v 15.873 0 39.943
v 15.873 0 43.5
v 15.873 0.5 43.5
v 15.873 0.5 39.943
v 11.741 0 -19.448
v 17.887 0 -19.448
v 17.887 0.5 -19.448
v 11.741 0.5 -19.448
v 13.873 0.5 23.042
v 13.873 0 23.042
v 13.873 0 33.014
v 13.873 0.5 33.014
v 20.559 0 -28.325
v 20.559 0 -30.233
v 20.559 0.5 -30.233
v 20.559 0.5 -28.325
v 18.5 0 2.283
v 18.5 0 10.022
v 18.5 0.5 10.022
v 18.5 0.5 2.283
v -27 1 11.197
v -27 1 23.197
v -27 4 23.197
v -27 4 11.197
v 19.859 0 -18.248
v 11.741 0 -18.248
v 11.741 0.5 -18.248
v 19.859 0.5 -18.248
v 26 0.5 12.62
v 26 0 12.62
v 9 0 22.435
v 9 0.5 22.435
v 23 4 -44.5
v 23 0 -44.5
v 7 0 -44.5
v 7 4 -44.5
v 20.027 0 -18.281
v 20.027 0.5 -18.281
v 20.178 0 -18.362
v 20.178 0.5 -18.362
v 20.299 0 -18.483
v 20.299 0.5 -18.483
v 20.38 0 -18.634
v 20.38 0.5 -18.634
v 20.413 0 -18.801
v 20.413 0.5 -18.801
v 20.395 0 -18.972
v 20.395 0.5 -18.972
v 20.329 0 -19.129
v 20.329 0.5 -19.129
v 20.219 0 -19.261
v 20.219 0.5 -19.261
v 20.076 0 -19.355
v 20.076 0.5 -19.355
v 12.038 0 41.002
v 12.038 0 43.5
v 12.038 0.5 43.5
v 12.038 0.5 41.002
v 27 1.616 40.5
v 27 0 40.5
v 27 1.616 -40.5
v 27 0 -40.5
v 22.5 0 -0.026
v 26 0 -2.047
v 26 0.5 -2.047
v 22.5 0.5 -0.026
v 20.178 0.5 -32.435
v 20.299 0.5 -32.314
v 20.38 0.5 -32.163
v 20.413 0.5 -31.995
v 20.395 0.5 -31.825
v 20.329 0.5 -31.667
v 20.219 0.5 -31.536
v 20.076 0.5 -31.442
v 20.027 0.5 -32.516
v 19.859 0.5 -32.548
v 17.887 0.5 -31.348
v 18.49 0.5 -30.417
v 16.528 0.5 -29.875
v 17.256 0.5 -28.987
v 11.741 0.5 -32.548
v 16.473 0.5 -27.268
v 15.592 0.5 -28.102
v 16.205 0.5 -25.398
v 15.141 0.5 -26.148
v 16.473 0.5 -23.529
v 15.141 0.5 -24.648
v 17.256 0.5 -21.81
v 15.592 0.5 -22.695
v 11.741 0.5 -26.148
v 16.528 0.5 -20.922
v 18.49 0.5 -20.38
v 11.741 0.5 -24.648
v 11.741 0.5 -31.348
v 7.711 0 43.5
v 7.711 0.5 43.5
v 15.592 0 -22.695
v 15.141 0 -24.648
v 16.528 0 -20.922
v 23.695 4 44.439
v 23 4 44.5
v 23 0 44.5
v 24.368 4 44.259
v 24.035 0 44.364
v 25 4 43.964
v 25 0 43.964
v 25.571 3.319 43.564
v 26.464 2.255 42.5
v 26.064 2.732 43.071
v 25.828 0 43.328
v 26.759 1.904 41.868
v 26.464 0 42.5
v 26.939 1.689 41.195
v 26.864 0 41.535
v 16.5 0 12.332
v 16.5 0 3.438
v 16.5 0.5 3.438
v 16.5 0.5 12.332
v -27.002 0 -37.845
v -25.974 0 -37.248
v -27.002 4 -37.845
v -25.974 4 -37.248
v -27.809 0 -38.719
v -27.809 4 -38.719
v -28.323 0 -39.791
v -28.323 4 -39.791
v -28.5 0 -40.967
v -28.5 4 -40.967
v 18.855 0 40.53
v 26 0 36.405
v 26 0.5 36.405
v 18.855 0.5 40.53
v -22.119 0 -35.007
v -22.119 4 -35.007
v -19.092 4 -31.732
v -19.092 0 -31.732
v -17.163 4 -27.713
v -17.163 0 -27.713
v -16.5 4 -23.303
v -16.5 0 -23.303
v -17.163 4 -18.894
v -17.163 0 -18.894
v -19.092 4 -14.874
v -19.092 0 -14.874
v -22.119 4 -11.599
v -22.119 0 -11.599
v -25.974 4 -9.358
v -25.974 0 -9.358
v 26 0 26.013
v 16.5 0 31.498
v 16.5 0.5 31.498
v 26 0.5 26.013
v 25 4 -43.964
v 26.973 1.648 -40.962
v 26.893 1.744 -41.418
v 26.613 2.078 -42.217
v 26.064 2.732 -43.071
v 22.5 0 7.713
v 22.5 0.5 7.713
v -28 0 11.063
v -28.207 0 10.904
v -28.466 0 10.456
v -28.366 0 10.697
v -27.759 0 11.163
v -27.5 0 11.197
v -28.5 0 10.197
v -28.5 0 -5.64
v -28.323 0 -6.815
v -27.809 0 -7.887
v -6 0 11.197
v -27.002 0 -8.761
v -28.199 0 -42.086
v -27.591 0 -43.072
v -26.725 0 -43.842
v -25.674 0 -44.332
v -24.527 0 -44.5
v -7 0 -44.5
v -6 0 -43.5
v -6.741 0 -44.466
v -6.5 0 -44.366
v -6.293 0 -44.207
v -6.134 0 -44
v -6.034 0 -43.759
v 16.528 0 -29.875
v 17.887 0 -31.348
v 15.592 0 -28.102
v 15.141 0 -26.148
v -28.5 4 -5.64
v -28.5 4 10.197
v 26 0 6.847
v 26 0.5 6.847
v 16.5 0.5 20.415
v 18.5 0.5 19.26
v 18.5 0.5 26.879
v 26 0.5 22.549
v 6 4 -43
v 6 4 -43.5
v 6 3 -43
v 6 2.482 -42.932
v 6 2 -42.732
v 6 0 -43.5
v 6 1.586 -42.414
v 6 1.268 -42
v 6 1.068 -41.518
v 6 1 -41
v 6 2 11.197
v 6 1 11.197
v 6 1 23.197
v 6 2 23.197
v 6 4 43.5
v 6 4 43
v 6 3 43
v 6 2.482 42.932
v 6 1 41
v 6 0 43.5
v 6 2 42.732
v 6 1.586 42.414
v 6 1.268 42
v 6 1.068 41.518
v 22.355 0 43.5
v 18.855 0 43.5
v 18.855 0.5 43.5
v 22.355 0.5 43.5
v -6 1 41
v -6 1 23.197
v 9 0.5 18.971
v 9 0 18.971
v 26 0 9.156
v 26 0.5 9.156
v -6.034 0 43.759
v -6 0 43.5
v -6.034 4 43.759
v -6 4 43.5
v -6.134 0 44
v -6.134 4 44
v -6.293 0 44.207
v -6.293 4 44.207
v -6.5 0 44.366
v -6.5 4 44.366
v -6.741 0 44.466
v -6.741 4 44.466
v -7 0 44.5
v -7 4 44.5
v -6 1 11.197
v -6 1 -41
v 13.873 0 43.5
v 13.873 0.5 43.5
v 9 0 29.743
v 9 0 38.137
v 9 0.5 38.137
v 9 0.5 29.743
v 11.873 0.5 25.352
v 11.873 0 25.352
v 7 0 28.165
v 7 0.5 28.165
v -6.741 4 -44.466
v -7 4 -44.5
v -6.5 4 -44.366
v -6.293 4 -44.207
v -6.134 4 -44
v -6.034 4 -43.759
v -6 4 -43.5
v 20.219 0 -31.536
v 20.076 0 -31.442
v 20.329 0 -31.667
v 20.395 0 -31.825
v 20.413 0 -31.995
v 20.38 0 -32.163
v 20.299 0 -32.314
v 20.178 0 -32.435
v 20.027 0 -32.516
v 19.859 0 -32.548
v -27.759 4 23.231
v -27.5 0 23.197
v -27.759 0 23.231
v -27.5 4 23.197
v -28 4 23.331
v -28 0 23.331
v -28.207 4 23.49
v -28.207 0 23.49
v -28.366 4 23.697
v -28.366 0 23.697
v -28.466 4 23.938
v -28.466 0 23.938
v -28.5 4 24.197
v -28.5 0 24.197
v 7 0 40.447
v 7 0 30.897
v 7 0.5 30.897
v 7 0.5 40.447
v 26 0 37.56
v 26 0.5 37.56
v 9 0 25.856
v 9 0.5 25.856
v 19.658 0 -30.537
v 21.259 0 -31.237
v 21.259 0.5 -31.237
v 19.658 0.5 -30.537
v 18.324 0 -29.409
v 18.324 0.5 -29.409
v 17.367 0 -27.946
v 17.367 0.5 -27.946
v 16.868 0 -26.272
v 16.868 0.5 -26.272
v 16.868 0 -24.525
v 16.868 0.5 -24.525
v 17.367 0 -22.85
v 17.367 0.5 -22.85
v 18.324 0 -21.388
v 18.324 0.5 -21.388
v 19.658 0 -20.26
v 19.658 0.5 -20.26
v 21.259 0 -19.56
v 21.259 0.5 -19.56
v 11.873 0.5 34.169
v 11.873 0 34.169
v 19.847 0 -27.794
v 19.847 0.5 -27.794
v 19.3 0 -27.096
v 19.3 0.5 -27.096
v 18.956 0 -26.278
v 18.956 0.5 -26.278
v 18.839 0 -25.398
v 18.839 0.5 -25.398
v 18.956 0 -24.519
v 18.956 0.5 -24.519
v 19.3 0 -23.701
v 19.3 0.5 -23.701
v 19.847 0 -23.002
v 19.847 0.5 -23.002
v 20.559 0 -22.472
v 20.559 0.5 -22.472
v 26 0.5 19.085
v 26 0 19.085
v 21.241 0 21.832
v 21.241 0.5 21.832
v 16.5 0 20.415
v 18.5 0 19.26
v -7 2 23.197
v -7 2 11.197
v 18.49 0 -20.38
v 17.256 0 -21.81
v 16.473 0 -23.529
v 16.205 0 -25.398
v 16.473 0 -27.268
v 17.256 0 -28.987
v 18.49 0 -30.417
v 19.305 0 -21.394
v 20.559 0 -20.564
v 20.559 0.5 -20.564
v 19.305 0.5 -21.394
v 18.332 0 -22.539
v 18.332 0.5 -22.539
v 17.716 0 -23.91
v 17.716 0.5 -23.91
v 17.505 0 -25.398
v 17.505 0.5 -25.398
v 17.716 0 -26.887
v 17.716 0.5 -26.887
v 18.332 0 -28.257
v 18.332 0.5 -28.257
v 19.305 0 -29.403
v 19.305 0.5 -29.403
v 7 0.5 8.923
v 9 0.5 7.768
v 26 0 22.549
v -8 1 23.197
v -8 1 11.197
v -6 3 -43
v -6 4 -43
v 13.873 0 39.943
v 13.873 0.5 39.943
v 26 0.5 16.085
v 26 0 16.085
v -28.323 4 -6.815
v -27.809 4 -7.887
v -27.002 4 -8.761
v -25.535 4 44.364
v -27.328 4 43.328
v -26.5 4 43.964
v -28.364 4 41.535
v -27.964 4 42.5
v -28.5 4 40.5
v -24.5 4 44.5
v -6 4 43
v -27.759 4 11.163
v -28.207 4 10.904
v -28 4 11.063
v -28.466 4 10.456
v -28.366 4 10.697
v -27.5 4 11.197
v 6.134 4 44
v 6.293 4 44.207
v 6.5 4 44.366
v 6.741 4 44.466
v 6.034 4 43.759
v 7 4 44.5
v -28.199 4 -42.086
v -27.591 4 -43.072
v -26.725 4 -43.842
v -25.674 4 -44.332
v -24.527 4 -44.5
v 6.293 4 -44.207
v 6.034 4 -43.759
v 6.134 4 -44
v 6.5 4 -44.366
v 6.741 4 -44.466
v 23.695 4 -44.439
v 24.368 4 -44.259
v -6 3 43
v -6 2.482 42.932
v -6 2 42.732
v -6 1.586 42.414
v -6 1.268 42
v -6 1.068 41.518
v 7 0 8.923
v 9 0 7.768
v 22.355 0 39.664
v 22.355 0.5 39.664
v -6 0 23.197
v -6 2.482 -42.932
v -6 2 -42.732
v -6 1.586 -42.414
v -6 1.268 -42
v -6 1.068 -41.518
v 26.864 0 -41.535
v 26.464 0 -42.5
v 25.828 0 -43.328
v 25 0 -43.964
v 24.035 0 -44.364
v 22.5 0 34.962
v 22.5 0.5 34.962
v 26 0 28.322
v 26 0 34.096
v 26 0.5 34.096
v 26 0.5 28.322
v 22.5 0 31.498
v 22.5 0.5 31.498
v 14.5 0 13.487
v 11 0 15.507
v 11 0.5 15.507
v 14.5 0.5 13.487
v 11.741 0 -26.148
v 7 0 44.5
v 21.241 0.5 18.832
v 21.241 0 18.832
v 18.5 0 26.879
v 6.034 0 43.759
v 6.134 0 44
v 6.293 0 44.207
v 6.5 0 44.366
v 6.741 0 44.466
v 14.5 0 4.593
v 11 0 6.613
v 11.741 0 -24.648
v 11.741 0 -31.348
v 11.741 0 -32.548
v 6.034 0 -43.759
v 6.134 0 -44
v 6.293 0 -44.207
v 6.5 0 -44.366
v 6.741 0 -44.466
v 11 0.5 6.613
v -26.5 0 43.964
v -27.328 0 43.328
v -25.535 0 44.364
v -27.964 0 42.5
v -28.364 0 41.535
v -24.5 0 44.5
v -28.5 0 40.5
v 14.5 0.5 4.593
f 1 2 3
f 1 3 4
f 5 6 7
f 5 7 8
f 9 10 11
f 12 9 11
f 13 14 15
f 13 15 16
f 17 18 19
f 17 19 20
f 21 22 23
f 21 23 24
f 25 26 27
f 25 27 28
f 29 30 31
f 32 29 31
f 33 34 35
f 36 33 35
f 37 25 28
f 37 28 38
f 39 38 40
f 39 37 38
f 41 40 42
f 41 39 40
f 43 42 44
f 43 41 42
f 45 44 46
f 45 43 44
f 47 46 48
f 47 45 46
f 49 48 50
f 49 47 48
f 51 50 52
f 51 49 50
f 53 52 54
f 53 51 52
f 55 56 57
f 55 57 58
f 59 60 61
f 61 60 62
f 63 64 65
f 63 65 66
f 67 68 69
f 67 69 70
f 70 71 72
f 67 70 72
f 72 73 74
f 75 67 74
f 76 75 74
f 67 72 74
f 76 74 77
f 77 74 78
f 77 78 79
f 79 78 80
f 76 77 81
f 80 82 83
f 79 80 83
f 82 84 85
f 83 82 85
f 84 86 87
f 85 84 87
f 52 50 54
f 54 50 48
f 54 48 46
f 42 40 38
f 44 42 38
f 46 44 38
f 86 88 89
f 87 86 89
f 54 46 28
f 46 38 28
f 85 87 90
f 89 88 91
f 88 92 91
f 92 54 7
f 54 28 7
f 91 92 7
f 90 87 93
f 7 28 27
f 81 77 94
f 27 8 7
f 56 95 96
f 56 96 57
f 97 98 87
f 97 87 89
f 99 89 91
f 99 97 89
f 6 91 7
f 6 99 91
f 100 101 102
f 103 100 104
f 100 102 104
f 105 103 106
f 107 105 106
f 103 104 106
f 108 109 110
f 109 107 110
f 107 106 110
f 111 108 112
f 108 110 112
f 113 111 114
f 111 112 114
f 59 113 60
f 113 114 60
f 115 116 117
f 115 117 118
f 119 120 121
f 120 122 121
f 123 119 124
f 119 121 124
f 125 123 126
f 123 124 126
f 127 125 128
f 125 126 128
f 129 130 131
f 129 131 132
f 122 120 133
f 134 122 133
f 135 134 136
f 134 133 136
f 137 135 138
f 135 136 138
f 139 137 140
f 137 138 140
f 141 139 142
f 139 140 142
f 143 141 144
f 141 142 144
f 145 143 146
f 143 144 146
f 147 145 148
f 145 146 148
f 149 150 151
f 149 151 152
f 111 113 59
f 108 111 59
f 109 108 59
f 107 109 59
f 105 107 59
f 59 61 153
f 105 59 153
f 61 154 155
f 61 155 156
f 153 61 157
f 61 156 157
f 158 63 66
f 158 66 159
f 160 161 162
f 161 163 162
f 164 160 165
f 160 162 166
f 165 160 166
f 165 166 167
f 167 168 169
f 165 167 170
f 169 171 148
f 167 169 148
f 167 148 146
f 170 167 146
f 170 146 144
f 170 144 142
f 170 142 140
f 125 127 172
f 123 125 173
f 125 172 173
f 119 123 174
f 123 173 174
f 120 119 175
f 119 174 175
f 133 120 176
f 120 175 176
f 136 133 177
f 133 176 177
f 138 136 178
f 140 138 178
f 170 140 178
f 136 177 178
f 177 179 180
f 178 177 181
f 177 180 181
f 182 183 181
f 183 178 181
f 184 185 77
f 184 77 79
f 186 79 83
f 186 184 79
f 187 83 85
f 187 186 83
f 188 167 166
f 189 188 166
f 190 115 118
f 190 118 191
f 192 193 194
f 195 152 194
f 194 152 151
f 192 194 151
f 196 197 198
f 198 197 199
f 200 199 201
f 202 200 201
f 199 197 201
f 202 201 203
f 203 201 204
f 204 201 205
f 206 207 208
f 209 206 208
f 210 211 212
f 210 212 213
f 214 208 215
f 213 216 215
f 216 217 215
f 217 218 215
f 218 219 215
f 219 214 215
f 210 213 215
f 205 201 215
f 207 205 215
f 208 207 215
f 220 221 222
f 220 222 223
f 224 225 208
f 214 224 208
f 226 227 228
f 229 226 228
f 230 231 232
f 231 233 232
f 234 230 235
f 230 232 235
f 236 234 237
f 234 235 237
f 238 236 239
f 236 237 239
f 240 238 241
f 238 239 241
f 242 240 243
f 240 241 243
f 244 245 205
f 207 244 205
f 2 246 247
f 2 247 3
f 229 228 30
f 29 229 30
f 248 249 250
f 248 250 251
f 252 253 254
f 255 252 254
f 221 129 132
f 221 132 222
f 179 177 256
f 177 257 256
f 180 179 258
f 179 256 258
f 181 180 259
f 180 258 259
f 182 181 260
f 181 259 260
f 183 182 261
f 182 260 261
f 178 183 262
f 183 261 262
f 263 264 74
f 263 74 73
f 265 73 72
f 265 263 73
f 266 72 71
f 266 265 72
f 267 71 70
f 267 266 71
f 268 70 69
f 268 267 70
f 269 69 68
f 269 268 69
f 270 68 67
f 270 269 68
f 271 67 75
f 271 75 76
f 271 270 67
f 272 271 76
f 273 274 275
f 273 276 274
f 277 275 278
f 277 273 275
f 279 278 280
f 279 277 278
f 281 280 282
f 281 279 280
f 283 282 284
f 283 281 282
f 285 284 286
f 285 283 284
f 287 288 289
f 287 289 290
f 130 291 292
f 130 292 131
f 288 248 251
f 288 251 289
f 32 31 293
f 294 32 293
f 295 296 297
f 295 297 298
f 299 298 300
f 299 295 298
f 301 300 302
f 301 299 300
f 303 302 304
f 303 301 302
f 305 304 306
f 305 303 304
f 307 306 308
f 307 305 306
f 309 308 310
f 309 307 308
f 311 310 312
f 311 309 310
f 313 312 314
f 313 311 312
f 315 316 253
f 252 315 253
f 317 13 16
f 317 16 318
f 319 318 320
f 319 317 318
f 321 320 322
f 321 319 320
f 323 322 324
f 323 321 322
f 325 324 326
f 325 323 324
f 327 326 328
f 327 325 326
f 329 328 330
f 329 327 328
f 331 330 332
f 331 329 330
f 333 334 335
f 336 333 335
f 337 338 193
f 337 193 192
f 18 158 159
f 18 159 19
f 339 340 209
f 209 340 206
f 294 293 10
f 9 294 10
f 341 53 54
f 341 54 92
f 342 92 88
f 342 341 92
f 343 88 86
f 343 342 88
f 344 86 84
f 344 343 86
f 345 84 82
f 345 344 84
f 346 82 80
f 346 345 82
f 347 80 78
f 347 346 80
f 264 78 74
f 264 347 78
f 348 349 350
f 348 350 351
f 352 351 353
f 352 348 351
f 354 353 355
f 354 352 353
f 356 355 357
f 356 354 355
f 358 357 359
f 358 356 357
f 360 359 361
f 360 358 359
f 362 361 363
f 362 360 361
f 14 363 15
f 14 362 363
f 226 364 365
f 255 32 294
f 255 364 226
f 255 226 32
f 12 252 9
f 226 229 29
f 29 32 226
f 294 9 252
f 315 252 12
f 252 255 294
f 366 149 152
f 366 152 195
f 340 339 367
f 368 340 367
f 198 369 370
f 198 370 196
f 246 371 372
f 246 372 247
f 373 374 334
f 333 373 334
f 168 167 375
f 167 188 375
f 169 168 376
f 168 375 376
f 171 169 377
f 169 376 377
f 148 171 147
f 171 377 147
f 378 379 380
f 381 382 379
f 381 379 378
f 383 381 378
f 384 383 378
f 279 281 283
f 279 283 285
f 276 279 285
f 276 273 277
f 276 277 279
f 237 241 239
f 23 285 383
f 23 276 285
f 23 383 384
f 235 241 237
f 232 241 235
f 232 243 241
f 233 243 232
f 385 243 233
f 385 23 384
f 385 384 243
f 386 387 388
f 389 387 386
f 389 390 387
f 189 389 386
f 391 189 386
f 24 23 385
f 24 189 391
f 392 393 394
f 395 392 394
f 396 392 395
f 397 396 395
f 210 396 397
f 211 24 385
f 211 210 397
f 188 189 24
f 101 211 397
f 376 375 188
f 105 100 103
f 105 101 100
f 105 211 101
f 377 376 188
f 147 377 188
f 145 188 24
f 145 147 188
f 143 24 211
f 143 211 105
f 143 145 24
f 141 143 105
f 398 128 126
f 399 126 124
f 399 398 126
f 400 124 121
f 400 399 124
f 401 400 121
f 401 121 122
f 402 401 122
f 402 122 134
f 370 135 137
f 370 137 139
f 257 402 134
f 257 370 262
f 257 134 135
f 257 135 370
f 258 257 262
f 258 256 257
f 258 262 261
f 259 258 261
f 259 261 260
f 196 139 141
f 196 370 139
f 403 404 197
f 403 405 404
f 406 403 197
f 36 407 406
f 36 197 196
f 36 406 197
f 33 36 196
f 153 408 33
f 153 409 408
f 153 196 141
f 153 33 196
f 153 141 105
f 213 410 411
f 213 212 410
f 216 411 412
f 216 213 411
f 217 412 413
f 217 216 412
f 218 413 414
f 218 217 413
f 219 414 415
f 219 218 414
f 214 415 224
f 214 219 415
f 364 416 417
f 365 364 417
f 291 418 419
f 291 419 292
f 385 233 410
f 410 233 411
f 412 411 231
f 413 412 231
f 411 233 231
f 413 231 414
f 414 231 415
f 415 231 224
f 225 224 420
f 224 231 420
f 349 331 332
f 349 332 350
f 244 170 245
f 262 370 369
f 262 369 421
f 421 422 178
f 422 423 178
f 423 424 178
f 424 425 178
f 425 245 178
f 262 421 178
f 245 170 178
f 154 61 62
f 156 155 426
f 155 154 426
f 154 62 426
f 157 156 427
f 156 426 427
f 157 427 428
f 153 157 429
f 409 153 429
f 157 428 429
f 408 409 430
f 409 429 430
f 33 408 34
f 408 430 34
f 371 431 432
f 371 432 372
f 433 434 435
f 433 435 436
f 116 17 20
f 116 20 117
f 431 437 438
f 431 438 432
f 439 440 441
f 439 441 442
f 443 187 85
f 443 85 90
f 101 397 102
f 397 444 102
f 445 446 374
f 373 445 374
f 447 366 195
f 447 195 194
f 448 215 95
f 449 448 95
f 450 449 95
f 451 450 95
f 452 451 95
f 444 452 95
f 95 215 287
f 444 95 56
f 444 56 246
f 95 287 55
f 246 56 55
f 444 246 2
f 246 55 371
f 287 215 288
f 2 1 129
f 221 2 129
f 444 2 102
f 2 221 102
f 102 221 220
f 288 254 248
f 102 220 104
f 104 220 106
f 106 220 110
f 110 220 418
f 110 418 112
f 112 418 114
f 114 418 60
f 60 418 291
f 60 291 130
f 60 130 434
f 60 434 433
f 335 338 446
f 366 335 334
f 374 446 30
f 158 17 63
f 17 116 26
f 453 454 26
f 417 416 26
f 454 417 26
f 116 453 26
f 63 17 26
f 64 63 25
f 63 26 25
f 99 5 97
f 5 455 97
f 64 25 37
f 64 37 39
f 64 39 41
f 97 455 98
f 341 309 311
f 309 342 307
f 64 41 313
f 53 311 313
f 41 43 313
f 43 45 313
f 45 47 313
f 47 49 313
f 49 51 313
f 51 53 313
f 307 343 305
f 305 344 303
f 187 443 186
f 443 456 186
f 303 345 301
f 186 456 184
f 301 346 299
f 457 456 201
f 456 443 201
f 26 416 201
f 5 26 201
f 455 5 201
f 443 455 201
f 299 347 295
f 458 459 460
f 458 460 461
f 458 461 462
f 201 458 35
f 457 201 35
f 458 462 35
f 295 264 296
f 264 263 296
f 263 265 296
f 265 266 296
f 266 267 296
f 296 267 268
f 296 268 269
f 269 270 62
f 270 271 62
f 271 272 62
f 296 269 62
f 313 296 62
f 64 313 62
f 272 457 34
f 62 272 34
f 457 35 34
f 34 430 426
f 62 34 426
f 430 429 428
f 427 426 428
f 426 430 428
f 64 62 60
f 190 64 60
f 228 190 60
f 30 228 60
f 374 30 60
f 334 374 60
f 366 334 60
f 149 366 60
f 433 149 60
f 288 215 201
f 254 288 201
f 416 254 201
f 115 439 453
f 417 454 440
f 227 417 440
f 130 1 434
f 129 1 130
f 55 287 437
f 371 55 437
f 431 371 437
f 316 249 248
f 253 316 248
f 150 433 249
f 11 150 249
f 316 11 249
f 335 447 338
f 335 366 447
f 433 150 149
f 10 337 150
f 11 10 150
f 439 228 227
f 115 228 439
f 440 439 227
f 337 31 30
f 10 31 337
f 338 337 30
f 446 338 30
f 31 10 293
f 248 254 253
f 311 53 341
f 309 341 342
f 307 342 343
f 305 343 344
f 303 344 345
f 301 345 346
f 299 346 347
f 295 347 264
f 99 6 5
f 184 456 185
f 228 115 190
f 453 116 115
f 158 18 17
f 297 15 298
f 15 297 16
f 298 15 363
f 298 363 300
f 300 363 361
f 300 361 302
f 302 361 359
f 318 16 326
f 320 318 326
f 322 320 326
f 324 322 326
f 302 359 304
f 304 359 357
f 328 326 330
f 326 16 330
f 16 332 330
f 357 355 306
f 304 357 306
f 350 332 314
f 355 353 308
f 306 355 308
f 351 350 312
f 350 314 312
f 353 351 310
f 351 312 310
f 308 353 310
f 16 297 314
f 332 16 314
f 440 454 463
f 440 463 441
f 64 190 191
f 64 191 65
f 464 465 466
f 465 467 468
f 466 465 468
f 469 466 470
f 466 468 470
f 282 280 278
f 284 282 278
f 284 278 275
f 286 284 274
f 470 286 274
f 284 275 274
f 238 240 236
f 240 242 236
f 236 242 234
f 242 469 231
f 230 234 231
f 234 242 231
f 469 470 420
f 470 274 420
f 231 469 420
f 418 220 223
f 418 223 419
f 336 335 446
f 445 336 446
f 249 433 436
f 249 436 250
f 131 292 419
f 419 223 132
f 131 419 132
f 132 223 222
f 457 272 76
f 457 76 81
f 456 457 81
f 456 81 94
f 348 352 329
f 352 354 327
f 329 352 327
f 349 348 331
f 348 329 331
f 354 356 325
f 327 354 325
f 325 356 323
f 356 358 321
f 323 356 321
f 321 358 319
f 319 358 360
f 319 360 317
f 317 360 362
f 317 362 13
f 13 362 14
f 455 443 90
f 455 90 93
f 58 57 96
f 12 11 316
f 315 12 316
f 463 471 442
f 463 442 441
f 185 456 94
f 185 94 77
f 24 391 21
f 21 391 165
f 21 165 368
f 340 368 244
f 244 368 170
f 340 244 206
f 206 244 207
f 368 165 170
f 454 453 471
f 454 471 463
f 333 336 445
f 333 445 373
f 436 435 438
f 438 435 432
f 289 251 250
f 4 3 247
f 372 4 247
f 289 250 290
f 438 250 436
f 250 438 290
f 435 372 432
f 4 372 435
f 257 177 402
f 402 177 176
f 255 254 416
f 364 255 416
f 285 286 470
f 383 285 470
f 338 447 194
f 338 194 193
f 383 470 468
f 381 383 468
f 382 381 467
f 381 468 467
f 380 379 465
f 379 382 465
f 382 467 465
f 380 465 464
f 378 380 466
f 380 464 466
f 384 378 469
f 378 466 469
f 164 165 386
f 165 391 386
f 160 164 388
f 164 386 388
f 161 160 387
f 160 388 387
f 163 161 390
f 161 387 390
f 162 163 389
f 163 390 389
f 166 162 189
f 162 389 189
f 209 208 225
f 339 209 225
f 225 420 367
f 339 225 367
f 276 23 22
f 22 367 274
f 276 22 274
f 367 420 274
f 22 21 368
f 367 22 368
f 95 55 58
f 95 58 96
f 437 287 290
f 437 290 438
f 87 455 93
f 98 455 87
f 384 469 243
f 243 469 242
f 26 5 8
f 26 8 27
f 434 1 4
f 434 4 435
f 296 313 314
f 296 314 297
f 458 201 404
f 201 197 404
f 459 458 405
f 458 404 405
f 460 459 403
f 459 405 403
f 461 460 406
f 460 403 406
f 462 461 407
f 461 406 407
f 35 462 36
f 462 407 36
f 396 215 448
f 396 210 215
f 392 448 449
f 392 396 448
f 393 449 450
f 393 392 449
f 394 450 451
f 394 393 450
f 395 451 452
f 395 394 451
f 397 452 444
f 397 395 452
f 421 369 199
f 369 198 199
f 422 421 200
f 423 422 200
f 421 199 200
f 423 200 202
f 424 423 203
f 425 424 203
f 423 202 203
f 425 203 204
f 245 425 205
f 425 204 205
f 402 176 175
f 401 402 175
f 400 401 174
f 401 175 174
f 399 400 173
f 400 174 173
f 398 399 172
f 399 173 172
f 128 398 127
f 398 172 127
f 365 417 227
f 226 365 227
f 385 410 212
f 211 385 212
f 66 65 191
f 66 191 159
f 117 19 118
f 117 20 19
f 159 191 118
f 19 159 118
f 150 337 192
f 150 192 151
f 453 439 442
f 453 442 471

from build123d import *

# Parameters (mm, degrees)
SKETCH1_W           = 12
SKETCH1_H           = 54.196938457
SKETCH1_H_2         = 12
SKETCH1_W_2         = 21
SKETCH1_H_3         = 19.803061543
BOSS_EXTRUDE1_DEPTH = 4
SKETCH1_3_W         = 12
SKETCH1_3_H         = 54.196938457
SKETCH1_3_H_2       = 19.803061543
SKETCH1_3_H_3       = 12
SKETCH1_3_W_2       = 21
CUT_EXTRUDE3_DEPTH  = 1
SKETCH1_4_W         = 12
SKETCH1_4_H         = 12
CUT_EXTRUDE4_DEPTH  = 2
CHAMFER1_SIZE       = 2
FILLET2_R           = 4
CHAMFER2_SIZE       = 2
CHAMFER2_SIZE2      = 2.383507185
FILLET1_R           = 4
FILLET3_R           = 2
FILLET4_R           = 1
CUT_EXTRUDE6_DEPTH  = 0.5
CUT_EXTRUDE5_DEPTH  = 0.5


with BuildPart() as part:
    # Sketch1 → Boss-Extrude1 (new body)
    with BuildSketch(Plane(origin=(0, 0, 0), x_dir=(1, 0, 0), z_dir=(0, 1, 0))):
        with BuildLine():
            Line((-6, 43), (-6, 44.5))
            Line((-6, 44.5), (-28.5, 44.5))
            Line((-28.5, 44.5), (-28.5, 38))
            ThreePointArc((-28.5, 38), (-16.5, 23.303061543), (-28.5, 8.606123087))
            Line((-28.5, 8.606123087), (-28.5, -11.196938457))
            Line((-28.5, -11.196938457), (-27, -11.196938457))
            Line((-27, -11.196938457), (-6, -11.196938457))
            Line((-6, -11.196938457), (-6, 43))
        make_face()
        with Locations((0, 15.901530771)):
            Rectangle(SKETCH1_W, SKETCH1_H)
        Polygon((27, -44.5), (27, 44.5), (6, 44.5), (6, 43), (6, -11.196938457), (6, -23.196938457), (6, -43), (6, -44.5), align=None)
        with Locations((0, -17.196938457)):
            Rectangle(SKETCH1_W, SKETCH1_H_2)
        with Locations((-16.5, -17.196938457)):
            Rectangle(SKETCH1_W_2, SKETCH1_H_2)
        Polygon((-28.5, -44.5), (-6, -44.5), (-6, -43), (-6, -23.196938457), (-27, -23.196938457), (-28.5, -23.196938457), align=None)
        with Locations((0, -33.098469229)):
            Rectangle(SKETCH1_W, SKETCH1_H_3)
    extrude(amount=BOSS_EXTRUDE1_DEPTH)

    # Sketch1<3> → Cut-Extrude3 (cut)
    with BuildSketch(Plane(origin=(0, 0, 0), x_dir=(1, 0, 0), z_dir=(0, 1, 0))):
        with Locations((0, 15.901530771)):
            Rectangle(SKETCH1_3_W, SKETCH1_3_H)
        with Locations((0, -33.098469229)):
            Rectangle(SKETCH1_3_W, SKETCH1_3_H_2)
        with Locations((0, -17.196938457)):
            Rectangle(SKETCH1_3_W, SKETCH1_3_H_3)
        with Locations((-16.5, -17.196938457)):
            Rectangle(SKETCH1_3_W_2, SKETCH1_3_H_3)
    extrude(amount=CUT_EXTRUDE3_DEPTH, mode=Mode.SUBTRACT)

    # Sketch1<4> → Cut-Extrude4 (cut)
    with BuildSketch(Plane(origin=(0, 0, 0), x_dir=(1, 0, 0), z_dir=(0, 1, 0))):
        with Locations((0, -17.196938457)):
            Rectangle(SKETCH1_4_W, SKETCH1_4_H)
    extrude(amount=CUT_EXTRUDE4_DEPTH, mode=Mode.SUBTRACT)

    # Chamfer1
    # the kernel refuses this chamfer: 2 mm, written as the material it takes off along each edge
    with BuildSketch(Plane(origin=(-6, 1, 23.196938457), x_dir=(0, 1, 0), z_dir=(0, 0, -1))) as chamfer1_piece_1_section:
        Polygon((CHAMFER1_SIZE, 0), (0, -CHAMFER1_SIZE), (0, 0), align=None)
    chamfer1_piece_1 = extrude(amount=12, mode=Mode.PRIVATE)
    chamfer1_piece_1 = split(chamfer1_piece_1, bisect_by=Plane(origin=(-6, 2, 23.196938457), z_dir=(0, -1, 0)), keep=Keep.TOP, mode=Mode.PRIVATE)
    add(chamfer1_piece_1, mode=Mode.SUBTRACT)

    # Fillet2
    fillet2_edges = [part.edges().sort_by_distance(p)[0] for p in [
        (-28.5, 2, -8.606123087),
        (-28.5, 2, -38),
    ]]
    fillet(fillet2_edges, radius=FILLET2_R)

    # Chamfer2
    chamfer2_edges = [part.edges().sort_by_distance(p)[0] for p in [
        (27, 4, 0),
    ]]
    chamfer2_side = [part.faces().sort_by_distance(p)[0] for p in [
        (0.667186488, 4, 1.280693721),
    ]]
    chamfer(chamfer2_edges, length=CHAMFER2_SIZE, length2=CHAMFER2_SIZE2, reference=chamfer2_side[0])

    # Fillet1
    # the kernel refuses this fillet: 4 mm, written as the material it takes off along each edge
    with BuildSketch(Plane(origin=(-28.5, -10, 44.5), x_dir=(1, 0, 0), z_dir=(0, 1, 0))) as fillet1_piece_1:
        with BuildLine():
            CenterArc((FILLET1_R, FILLET1_R), FILLET1_R, 180, 90)
            Line((0, FILLET1_R), (-FILLET1_R * 0.02, FILLET1_R))
            Line((-FILLET1_R * 0.02, FILLET1_R), (-FILLET1_R * 0.02, -FILLET1_R * 0.02))
            Line((-FILLET1_R * 0.02, -FILLET1_R * 0.02), (FILLET1_R, -FILLET1_R * 0.02))
            Line((FILLET1_R, -FILLET1_R * 0.02), (FILLET1_R, 0))
        make_face()
    extrude(amount=24, mode=Mode.SUBTRACT)
    with BuildSketch(Plane(origin=(-28.5, -9.931735764, -44.5), x_dir=(1, 0, 0), z_dir=(0, 1, 0))) as fillet1_piece_2:
        with BuildLine():
            CenterArc((3.972694306, -4), FILLET1_R, 90, 83.301437518)
            Line((0, -3.533416724), (-0.079453886, -3.524085059))
            ThreePointArc((-0.079453886, -3.524085059), (-0.08, -1.766708362), (-0.08, 0))
            Line((-0.08, 0), (0, 0.08))
            Line((0, 0.08), (3.972694306, 0.08))
            Line((3.972694306, 0.08), (3.972694306, 0))
        make_face()
    extrude(amount=23.863471529, mode=Mode.SUBTRACT)
    with BuildSketch(Plane(origin=(27, -10, -44.5), x_dir=(-1, 0, 0), z_dir=(0, 1, 0))) as fillet1_piece_3:
        with BuildLine():
            CenterArc((FILLET1_R, FILLET1_R), FILLET1_R, 180, 90)
            Line((0, FILLET1_R), (-FILLET1_R * 0.02, FILLET1_R))
            Line((-FILLET1_R * 0.02, FILLET1_R), (-FILLET1_R * 0.02, -FILLET1_R * 0.02))
            Line((-FILLET1_R * 0.02, -FILLET1_R * 0.02), (FILLET1_R, -FILLET1_R * 0.02))
            Line((FILLET1_R, -FILLET1_R * 0.02), (FILLET1_R, 0))
        make_face()
    extrude(amount=21.616492815, mode=Mode.SUBTRACT)
    with BuildSketch(Plane(origin=(27, -10, 44.5), x_dir=(-1, 0, 0), z_dir=(0, 1, 0))) as fillet1_piece_4:
        with BuildLine():
            CenterArc((FILLET1_R, -FILLET1_R), FILLET1_R, 90, 90)
            Line((0, -FILLET1_R), (-FILLET1_R * 0.02, -FILLET1_R))
            Line((-FILLET1_R * 0.02, -FILLET1_R), (-FILLET1_R * 0.02, FILLET1_R * 0.02))
            Line((-FILLET1_R * 0.02, FILLET1_R * 0.02), (FILLET1_R, FILLET1_R * 0.02))
            Line((FILLET1_R, FILLET1_R * 0.02), (FILLET1_R, 0))
        make_face()
    extrude(amount=21.616492815, mode=Mode.SUBTRACT)

    # Fillet3
    fillet3_edges = [part.edges().sort_by_distance(p)[0] for p in [
        (0, 1, -43),
        (0, 1, 43),
    ]]
    fillet(fillet3_edges, radius=FILLET3_R)

    # Fillet4
    fillet4_edges = [part.edges().sort_by_distance(p)[0] for p in [
        (-6, 2, 44.5),
        (-28.5, 2, 23.196938457),
        (-28.5, 2, 11.196938457),
        (-6, 2, -44.5),
        (6, 2, -44.5),
        (6, 2, 44.5),
    ]]
    fillet(fillet4_edges, radius=FILLET4_R)

    # Sketch3 → Cut-Extrude6 (cut)
    with BuildSketch(Plane.XZ):
        Polygon((26, 6.846975509), (26, -2.047005384), (22.5, -0.026279442), (22.5, 7.713000913), (18.5, 10.022401989), (18.5, 2.283121635), (16.5, 3.437822174), (16.5, 12.331803066), align=None)
        Polygon((9, 7.767949192), (9, 18.971331162), (26, 9.156376586), (26, 12.620478201), (9, 22.435432777), (9, 25.855728078), (13.872673559, 23.042488687), (13.872673559, 33.014498231), (11.872673559, 34.16919877), (11.872673559, 25.351889764), (7, 28.165129155), (7, 8.922649731), align=None)
        Polygon((14.5, 4.592522712), (11, 6.613248654), (11, 15.507229547), (14.5, 13.486503605), align=None)
        Polygon((26, 19.084579816), (21.241040405, 21.832166419), (21.241040405, 18.832166419), (26, 16.084579816), align=None)
        Polygon((18.5, 26.87880845), (18.5, 19.260006297), (16.5, 20.414706835), (16.5, 31.497610604), (26, 26.012783046), (26, 22.548681431), align=None)
        Polygon((26, 34.095686815), (26, 28.322184123), (9, 38.137138699), (9, 29.742507874), (7, 30.897208412), (7, 40.446539776), (22.5, 31.497610604), (22.5, 34.961712219), (13.872673559, 39.942701462), (13.872673559, 43.5), (15.872673559, 43.5), (15.872673559, 39.942701462), align=None)
        Polygon((26, 36.405087892), (18.855212659, 40.530132787), (18.855212659, 43.5), (22.355212659, 43.5), (22.355212659, 39.664107383), (26, 37.55978843), align=None)
        Polygon((12.038363906, 41.001740633), (7.711251753, 43.5), (12.038363906, 43.5), align=None)
    extrude(amount=-CUT_EXTRUDE6_DEPTH, mode=Mode.SUBTRACT)

    # Sketch2 → Cut-Extrude5 (cut)
    # profile 1 of 3: a face of its own
    with BuildSketch(Plane.XZ):
        with BuildLine():
            Line((21.258663757, -19.559912495), (21.258663757, -31.236746335))
            ThreePointArc((21.258663757, -31.236746335), (16.804977927, -25.398329415), (21.258663757, -19.559912495))
        make_face()
        with BuildLine():
            ThreePointArc((20.558663757, -20.563874743), (17.504977927, -25.398329415), (20.558663757, -30.232784086))
            Line((20.558663757, -30.232784086), (20.558663757, -28.325034046))
            Line((20.558663757, -28.325034046), (20.558663757, -22.471624783))
            Line((20.558663757, -22.471624783), (20.558663757, -20.563874743))
        make_face(mode=Mode.SUBTRACT)
    # profile 2 of 3: a face of its own
    with BuildSketch(Plane.XZ):
        with BuildLine():
            Line((20.558663757, -22.471624783), (20.558663757, -28.325034046))
            ThreePointArc((20.558663757, -28.325034046), (18.838663757, -25.398329415), (20.558663757, -22.471624783))
        make_face()
    # profile 3 of 3: a face of its own
    with BuildSketch(Plane.XZ):
        with BuildLine():
            ThreePointArc((20.075747841, -19.354579409), (16.204977927, -25.398329415), (20.075747841, -31.442079421))
            ThreePointArc((20.075747841, -31.442079421), (20.402353273, -32.080361375), (19.859139802, -32.548329415))
            Line((19.859139802, -32.548329415), (11.741336243, -32.548329415))
            Line((11.741336243, -32.548329415), (11.741336243, -31.348329415))
            Line((11.741336243, -31.348329415), (17.887029825, -31.348329415))
            ThreePointArc((17.887029825, -31.348329415), (16.002102254, -29.018717282), (15.141336243, -26.148329415))
            Line((15.141336243, -26.148329415), (11.741336243, -26.148329415))
            Line((11.741336243, -26.148329415), (11.741336243, -24.648329415))
            Line((11.741336243, -24.648329415), (15.141336243, -24.648329415))
            ThreePointArc((15.141336243, -24.648329415), (16.002102254, -21.777941547), (17.887029825, -19.448329415))
            Line((17.887029825, -19.448329415), (11.741336243, -19.448329415))
            Line((11.741336243, -19.448329415), (11.741336243, -18.248329415))
            Line((11.741336243, -18.248329415), (19.859139802, -18.248329415))
            ThreePointArc((19.859139802, -18.248329415), (20.402353273, -18.716297455), (20.075747841, -19.354579409))
        make_face()
    extrude(amount=-CUT_EXTRUDE5_DEPTH, mode=Mode.SUBTRACT)


solid = part.part
